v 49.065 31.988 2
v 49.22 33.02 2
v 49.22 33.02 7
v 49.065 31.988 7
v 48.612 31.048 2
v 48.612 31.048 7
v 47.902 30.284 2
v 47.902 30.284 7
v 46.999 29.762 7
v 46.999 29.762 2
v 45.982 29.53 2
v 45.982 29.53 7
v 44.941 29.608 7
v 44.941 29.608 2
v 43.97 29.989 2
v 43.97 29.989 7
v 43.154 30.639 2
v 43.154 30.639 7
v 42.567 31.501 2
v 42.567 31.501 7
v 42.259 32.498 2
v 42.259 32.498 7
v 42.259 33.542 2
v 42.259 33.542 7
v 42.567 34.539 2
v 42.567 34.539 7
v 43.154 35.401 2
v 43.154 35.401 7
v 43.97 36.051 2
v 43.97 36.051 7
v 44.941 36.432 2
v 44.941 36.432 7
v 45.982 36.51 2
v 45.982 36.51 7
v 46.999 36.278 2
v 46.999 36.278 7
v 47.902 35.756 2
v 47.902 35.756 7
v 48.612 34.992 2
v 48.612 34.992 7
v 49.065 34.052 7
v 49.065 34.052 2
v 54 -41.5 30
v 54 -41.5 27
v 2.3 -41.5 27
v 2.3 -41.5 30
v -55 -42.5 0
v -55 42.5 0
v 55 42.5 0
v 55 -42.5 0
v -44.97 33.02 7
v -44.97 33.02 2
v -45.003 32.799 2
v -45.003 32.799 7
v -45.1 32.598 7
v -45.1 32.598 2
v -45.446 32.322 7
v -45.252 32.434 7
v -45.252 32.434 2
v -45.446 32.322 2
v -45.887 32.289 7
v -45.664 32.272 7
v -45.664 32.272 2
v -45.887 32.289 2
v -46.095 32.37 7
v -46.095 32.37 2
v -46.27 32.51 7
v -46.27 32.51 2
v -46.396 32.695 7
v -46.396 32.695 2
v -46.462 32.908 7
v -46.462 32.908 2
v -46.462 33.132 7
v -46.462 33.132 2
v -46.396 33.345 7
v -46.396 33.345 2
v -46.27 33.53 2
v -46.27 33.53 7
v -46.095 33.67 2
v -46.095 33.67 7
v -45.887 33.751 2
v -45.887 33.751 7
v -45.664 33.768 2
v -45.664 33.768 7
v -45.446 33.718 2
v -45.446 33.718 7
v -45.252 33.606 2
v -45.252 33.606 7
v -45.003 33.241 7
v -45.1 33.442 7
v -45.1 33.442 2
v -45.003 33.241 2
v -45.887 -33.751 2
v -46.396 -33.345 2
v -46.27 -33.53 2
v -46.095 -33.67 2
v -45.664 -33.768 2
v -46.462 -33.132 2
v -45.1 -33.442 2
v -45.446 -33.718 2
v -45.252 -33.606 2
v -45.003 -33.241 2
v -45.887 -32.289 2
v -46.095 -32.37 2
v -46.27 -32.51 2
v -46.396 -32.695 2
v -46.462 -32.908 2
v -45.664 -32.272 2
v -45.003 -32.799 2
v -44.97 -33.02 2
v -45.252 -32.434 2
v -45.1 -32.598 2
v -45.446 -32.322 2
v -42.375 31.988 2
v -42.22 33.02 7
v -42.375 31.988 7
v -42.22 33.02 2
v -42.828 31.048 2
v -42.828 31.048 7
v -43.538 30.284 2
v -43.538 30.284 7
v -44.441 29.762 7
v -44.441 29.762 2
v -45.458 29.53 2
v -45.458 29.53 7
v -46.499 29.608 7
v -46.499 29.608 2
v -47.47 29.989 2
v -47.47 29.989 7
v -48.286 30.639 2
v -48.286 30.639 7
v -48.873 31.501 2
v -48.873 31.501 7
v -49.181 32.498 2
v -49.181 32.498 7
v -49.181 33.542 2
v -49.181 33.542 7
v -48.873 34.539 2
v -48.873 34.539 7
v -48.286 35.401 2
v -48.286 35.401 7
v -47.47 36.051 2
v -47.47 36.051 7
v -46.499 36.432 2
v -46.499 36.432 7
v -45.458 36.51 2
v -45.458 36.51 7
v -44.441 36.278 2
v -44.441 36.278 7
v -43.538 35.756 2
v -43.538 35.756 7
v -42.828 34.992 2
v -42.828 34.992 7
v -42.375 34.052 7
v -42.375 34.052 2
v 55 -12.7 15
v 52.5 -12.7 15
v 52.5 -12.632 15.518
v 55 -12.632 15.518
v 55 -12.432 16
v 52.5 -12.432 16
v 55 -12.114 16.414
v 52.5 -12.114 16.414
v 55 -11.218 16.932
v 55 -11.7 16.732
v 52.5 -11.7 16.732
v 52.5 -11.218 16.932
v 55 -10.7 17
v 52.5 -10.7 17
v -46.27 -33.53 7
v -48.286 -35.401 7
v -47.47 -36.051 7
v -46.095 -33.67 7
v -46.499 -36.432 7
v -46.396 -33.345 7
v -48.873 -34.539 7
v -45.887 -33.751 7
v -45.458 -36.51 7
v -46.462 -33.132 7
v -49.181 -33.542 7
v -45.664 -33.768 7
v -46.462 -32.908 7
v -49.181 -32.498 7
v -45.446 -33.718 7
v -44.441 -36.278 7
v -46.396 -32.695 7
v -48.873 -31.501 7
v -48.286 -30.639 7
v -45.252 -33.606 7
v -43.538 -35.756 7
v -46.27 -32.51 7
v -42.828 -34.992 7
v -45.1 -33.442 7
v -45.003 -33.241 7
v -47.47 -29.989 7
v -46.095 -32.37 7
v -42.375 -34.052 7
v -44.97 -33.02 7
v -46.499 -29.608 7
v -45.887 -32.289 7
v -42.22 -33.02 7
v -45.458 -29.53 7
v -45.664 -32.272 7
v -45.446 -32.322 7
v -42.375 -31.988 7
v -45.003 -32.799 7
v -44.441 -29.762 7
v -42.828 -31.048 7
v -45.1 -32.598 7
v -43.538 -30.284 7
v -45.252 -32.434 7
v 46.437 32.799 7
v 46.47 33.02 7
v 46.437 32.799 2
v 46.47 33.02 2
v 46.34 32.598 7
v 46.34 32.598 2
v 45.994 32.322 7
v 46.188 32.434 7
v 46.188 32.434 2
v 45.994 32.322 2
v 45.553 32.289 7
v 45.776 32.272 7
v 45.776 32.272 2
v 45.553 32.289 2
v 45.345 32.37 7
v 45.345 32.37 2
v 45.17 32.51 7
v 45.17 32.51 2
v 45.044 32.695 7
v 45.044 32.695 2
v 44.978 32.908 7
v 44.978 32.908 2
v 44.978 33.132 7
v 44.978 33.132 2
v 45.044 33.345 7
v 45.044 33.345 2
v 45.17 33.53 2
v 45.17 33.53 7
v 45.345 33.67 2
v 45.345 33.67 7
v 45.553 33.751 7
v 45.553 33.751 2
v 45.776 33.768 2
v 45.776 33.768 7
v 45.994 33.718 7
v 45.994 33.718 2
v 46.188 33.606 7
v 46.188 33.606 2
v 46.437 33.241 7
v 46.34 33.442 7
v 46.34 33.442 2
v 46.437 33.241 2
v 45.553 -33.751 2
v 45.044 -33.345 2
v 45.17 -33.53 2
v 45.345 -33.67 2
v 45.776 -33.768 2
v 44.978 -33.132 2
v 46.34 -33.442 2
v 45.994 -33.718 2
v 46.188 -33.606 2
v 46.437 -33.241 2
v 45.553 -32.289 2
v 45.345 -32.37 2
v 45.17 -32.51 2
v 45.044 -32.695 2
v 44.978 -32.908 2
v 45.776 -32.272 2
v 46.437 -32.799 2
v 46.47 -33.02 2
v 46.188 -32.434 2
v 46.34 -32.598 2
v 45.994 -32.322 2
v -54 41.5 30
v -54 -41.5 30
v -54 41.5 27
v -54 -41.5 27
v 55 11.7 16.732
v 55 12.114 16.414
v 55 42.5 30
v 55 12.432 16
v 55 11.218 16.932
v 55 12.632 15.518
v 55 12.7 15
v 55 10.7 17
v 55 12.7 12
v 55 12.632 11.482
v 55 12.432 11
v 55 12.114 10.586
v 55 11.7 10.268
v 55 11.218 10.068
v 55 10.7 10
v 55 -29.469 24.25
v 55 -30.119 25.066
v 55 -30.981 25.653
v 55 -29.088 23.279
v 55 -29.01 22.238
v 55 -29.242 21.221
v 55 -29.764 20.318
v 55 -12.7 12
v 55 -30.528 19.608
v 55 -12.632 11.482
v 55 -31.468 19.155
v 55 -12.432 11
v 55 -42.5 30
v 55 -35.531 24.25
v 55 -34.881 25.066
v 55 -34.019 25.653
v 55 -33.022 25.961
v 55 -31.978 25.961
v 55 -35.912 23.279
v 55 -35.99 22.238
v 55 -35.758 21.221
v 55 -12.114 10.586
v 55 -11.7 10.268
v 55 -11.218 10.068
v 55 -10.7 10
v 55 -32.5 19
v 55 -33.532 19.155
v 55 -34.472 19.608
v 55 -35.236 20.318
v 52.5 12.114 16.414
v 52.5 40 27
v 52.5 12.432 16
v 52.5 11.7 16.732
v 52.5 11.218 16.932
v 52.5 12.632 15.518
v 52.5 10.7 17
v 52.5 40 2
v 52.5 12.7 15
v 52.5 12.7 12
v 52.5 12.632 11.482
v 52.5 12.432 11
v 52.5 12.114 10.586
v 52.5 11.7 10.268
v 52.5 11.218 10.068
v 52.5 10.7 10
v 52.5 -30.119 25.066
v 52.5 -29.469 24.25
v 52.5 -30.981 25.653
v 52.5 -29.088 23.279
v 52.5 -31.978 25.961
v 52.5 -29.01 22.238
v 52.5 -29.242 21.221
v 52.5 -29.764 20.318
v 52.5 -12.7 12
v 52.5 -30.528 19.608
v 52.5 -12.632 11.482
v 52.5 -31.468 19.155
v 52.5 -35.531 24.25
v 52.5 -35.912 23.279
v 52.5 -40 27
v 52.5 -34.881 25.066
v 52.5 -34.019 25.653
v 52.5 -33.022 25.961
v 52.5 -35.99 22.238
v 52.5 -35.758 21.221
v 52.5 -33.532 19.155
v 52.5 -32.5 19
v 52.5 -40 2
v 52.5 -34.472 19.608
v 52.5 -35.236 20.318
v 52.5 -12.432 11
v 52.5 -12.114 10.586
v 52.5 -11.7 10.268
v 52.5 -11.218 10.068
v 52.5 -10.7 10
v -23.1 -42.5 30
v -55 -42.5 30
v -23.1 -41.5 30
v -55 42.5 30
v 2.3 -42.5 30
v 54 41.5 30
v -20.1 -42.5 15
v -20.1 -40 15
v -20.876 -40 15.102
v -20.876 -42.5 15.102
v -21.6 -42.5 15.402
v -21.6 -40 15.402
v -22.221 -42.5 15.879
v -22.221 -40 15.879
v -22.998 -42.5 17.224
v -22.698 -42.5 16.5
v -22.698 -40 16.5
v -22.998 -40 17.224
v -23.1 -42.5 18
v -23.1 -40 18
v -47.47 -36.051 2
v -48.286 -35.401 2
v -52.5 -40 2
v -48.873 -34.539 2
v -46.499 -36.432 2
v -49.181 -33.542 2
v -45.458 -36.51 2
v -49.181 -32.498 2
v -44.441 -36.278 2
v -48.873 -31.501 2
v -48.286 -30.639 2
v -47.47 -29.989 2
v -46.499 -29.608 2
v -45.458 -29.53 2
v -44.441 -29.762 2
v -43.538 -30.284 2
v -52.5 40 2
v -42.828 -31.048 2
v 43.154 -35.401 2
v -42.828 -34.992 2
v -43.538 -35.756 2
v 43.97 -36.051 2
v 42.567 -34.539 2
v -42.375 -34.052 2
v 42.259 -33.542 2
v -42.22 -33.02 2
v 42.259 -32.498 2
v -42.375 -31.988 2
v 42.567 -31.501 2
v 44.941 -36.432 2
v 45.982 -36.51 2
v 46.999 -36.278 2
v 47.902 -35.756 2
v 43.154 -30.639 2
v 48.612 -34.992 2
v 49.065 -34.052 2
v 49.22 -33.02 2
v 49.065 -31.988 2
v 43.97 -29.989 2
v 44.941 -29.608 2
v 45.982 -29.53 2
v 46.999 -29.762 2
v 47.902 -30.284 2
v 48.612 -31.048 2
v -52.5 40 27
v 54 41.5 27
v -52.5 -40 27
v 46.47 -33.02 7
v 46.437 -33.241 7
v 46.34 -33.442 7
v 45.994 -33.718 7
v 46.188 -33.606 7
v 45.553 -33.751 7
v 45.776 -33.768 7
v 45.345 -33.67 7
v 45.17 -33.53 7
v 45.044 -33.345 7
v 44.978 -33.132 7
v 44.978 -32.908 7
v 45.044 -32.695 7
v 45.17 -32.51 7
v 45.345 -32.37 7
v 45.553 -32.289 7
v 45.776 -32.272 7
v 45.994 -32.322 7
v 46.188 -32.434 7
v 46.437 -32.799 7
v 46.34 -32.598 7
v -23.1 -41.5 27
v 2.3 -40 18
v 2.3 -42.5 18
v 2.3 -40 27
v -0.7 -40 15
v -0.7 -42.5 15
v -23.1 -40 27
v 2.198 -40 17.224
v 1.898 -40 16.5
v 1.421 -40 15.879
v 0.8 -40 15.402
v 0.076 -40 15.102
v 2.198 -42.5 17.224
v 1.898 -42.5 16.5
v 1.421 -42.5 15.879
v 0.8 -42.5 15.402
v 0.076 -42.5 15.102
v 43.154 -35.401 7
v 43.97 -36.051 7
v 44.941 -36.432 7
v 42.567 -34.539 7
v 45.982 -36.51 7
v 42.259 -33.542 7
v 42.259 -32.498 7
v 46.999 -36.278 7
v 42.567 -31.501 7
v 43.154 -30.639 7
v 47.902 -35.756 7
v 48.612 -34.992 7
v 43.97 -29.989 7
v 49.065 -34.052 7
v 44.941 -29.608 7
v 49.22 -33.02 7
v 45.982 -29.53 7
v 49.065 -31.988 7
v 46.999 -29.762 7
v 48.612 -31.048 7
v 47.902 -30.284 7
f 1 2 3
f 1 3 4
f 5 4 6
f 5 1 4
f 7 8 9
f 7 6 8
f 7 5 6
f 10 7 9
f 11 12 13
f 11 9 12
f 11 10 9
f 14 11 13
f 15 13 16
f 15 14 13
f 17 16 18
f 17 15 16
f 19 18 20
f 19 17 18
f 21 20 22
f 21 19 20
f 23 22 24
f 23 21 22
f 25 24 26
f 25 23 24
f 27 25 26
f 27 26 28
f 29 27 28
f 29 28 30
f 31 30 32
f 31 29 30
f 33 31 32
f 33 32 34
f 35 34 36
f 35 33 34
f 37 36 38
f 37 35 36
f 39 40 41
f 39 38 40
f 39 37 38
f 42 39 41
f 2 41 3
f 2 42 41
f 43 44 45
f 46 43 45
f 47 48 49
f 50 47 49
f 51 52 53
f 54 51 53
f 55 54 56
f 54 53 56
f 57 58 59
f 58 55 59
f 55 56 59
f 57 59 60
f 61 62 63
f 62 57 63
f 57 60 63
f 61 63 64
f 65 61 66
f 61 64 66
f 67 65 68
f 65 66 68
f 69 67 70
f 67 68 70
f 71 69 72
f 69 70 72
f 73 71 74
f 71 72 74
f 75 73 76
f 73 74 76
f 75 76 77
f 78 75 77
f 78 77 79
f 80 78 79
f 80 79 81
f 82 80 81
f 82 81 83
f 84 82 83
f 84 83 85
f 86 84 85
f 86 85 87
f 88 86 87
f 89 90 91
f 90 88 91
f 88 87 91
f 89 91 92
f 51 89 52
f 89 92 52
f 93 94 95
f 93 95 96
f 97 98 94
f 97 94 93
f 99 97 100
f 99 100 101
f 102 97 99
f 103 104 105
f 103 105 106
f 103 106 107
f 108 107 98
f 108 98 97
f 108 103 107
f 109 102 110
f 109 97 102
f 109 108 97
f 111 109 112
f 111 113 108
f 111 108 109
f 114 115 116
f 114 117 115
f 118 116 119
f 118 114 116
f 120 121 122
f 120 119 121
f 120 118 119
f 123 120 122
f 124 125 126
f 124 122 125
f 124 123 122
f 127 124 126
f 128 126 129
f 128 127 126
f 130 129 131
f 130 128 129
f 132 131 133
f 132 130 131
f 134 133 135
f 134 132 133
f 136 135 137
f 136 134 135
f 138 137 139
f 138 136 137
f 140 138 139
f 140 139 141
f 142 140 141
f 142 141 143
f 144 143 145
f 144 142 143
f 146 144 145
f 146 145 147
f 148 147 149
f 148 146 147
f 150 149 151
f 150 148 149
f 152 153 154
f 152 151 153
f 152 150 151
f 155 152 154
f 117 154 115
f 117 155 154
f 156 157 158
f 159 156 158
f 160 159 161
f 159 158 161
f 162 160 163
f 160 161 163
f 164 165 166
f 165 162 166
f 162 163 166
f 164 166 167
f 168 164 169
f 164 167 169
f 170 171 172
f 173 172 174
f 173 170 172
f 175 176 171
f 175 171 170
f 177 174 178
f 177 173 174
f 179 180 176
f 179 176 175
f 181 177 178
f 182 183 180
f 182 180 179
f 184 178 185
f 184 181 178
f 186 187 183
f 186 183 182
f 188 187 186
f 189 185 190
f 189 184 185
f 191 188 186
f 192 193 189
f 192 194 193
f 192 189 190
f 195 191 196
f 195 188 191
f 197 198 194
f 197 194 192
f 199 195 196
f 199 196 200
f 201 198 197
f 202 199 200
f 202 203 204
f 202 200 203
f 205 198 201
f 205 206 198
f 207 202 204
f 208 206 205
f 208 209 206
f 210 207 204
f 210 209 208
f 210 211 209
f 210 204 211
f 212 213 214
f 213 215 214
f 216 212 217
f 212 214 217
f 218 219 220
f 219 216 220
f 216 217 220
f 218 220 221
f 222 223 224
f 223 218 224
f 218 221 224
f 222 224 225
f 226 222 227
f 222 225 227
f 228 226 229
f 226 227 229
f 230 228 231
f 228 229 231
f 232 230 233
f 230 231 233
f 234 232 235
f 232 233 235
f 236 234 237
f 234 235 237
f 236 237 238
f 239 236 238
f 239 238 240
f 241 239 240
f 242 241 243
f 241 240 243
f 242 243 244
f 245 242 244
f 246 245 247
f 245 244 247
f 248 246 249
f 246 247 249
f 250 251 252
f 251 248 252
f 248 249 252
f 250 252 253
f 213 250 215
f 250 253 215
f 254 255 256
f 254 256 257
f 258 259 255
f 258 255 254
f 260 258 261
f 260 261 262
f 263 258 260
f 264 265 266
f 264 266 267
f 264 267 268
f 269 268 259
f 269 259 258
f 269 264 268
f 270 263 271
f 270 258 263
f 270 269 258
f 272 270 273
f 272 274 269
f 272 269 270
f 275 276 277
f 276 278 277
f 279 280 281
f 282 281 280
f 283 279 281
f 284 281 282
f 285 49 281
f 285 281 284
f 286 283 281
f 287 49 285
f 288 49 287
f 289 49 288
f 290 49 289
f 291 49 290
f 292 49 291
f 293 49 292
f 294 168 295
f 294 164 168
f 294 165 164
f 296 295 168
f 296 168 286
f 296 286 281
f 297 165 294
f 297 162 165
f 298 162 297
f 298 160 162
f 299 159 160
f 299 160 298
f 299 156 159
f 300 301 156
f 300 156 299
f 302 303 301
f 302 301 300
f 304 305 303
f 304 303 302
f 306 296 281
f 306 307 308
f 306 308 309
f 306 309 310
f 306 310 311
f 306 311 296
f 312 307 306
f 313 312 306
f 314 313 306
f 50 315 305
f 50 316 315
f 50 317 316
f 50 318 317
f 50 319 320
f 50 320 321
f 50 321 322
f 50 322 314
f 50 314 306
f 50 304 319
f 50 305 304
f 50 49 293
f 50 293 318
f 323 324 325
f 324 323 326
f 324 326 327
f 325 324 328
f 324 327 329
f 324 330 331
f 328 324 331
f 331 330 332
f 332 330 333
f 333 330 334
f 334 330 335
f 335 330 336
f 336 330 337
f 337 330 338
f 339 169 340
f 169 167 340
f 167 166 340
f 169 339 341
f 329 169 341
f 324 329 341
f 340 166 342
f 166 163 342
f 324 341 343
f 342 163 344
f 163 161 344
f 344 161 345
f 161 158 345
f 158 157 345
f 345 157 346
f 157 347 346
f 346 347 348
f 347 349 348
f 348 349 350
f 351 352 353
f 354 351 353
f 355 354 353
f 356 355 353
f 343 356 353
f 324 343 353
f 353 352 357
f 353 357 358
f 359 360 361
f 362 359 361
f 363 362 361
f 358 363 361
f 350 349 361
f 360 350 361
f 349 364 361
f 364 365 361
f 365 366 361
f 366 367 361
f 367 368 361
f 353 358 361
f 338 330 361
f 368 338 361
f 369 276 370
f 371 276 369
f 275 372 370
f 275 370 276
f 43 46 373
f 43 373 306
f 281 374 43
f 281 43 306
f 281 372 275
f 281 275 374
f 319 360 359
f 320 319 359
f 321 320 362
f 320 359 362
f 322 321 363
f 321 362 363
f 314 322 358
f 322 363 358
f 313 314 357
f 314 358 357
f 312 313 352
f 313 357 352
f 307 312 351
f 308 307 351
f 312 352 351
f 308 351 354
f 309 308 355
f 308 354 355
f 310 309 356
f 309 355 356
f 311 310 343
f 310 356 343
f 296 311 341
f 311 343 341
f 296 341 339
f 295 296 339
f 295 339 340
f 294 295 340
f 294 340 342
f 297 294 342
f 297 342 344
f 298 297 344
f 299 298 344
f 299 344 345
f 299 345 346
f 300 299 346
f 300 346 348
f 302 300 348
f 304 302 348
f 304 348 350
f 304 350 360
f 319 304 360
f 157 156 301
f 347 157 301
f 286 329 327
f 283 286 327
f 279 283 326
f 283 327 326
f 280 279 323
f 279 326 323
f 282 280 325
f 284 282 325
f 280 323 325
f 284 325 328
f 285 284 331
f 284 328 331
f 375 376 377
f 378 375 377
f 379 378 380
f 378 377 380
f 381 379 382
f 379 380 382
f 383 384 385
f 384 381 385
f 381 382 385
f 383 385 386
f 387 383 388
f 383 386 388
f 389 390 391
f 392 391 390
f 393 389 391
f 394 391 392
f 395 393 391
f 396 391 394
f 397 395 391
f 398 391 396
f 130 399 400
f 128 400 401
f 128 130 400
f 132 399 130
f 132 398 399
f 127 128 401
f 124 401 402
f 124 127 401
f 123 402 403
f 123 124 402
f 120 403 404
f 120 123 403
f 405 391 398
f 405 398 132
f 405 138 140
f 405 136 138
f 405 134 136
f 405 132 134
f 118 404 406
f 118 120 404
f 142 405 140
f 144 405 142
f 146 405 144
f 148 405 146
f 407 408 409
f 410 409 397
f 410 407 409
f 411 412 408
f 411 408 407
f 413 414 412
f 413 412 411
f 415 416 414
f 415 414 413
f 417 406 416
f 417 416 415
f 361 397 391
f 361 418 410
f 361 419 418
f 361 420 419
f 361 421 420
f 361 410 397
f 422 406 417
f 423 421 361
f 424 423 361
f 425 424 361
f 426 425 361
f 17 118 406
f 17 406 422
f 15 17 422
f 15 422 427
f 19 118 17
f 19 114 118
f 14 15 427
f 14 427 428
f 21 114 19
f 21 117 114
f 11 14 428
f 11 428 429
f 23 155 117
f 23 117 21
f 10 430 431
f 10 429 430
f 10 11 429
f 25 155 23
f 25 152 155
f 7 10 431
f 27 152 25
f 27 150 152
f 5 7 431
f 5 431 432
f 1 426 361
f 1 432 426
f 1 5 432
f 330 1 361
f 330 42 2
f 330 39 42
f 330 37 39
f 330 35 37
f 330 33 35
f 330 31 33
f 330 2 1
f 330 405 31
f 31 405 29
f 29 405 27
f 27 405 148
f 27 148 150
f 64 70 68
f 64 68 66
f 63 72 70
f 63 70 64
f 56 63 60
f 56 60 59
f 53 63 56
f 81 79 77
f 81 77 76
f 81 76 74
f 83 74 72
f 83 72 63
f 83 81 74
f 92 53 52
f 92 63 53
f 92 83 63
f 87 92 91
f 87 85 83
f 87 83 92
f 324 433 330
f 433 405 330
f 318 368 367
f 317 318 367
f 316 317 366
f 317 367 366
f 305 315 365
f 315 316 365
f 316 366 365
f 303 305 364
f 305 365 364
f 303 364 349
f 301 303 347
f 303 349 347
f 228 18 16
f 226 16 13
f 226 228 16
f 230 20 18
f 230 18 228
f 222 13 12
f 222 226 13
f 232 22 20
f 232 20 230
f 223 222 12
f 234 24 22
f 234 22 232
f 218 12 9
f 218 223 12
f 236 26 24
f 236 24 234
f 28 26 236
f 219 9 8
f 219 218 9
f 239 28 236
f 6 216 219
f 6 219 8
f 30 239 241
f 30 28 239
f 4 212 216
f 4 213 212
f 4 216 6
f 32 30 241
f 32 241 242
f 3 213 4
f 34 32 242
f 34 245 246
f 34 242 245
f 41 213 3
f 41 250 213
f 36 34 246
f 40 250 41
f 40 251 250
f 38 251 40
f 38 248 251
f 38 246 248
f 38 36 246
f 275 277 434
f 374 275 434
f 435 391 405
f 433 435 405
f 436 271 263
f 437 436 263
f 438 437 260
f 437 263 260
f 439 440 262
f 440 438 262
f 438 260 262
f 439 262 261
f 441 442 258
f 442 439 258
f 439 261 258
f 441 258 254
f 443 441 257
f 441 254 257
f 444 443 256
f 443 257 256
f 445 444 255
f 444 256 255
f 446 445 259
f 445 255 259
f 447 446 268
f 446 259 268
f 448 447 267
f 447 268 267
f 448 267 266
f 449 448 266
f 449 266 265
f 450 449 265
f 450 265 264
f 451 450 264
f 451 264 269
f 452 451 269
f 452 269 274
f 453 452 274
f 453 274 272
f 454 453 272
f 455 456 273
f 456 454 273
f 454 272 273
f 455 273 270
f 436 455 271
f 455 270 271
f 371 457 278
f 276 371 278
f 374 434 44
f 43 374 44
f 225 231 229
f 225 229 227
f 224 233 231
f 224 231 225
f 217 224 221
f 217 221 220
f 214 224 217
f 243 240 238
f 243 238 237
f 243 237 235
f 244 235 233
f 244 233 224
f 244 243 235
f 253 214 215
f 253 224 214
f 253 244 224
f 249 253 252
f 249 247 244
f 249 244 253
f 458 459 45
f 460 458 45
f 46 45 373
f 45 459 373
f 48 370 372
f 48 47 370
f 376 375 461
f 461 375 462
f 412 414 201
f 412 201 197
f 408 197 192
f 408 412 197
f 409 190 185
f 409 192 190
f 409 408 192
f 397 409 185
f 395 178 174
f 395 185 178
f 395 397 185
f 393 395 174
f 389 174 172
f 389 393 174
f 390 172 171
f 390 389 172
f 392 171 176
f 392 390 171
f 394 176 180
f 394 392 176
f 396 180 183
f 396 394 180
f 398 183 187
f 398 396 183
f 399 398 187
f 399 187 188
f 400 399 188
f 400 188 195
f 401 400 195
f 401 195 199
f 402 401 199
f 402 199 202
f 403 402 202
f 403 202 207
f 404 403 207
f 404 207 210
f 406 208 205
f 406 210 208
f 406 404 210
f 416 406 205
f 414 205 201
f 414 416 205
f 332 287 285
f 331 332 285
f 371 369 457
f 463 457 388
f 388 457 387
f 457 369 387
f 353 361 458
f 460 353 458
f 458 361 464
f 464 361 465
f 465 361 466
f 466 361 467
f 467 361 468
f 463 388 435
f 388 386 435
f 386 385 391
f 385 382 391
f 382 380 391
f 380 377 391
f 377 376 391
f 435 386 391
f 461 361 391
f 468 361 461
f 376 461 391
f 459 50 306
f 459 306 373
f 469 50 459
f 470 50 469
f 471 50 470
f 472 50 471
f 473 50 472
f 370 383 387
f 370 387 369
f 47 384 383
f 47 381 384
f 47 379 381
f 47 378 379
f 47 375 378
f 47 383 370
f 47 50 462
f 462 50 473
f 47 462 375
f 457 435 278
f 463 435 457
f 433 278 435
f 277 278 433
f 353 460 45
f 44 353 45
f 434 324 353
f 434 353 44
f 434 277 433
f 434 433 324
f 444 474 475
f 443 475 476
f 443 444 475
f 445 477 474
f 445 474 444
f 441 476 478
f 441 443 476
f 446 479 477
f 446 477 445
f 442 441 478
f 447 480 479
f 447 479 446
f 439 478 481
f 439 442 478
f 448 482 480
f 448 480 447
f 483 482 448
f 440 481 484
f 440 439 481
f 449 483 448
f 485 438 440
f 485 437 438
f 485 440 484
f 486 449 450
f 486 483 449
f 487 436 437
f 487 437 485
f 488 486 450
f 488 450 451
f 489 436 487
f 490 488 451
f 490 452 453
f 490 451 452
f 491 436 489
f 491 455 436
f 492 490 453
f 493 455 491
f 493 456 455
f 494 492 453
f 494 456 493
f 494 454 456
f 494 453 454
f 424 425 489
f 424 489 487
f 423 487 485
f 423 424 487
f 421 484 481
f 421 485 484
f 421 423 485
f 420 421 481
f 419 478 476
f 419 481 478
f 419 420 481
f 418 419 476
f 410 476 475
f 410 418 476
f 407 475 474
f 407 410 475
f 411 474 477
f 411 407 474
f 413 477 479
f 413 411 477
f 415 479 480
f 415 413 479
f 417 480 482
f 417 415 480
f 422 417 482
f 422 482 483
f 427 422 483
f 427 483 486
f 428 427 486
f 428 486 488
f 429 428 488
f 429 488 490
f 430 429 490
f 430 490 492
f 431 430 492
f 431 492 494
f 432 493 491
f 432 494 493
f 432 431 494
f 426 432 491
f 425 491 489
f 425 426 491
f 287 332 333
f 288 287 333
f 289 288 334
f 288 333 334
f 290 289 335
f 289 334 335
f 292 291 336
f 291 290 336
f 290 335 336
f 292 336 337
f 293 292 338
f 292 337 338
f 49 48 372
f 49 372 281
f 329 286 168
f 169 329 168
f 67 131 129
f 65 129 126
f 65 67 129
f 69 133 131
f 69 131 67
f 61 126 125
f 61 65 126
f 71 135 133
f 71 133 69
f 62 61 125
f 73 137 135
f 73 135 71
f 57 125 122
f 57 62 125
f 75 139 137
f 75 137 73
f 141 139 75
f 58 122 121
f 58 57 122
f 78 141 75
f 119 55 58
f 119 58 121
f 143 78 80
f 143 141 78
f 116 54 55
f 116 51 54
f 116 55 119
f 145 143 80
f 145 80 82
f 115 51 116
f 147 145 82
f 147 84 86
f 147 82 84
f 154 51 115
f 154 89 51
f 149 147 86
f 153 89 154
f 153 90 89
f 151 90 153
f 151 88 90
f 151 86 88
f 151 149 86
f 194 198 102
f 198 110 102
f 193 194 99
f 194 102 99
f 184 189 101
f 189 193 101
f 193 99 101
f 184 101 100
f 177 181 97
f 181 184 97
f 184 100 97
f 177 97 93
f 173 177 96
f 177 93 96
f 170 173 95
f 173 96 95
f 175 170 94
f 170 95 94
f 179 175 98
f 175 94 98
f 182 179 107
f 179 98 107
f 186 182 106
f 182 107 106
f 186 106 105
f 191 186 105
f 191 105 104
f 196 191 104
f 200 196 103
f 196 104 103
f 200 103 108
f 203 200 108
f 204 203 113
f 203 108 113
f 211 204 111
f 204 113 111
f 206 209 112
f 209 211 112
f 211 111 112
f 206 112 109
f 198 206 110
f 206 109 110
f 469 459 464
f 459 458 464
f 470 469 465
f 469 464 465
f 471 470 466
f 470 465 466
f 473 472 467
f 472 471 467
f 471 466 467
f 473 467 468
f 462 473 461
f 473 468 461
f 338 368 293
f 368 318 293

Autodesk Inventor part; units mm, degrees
ref_plane "YZ Plane" through (0, 0, 0) normal (1, 0, 0) x (0, 1, 0)
ref_plane "XZ Plane" through (0, 0, 0) normal (0, 1, 0) x (-1, 0, 0)
ref_plane "XY Plane" through (0, 0, 0) normal (0, 0, 1) x (1, 0, 0)
sketch "Esboço1" plane through (0, 0, 0) normal (0, 0, 1) x (1, 0, 0)
  line L0 (-55, -42.5) -> (55, -42.5)
  line L1 (55, -42.5) -> (55, 42.5)
  line L2 (55, 42.5) -> (-55, 42.5)
  line L3 (-55, 42.5) -> (-55, -42.5)
  line L4 (-55, -42.5) -> (55, 42.5) construction
  line L5 (55, -42.5) -> (-55, 42.5) construction
  point P0 (0, 0)
  dimension "d0" = 110
  dimension "d1" = 85
extrude "Extrusão1" add sketch "Esboço1" along normal blind 2
sketch "Esboço2" plane through (0, 0, 2) normal (0, 0, 1) x (1, 0, 0)
  line L0 (55, 42.5) -> (-55, 42.5) projected
  line L1 (55, -42.5) -> (-55, -42.5)
  line L2 (-55, -42.5) -> (-55, 42.5)
  line L3 (-55, 42.5) -> (55, 42.5)
  line L4 (55, 42.5) -> (55, -42.5)
  line L5 (55, -42.5) -> (-55, 42.5) construction
  line L6 (-55, -42.5) -> (55, 42.5) construction
  line L7 (52.5, -40) -> (-52.5, -40)
  line L8 (-52.5, -40) -> (-52.5, 40)
  line L9 (-52.5, 40) -> (52.5, 40)
  line L10 (52.5, 40) -> (52.5, -40)
  line L11 (52.5, -40) -> (-52.5, 40) construction
  line L12 (-52.5, -40) -> (52.5, 40) construction
  point P0 (0, 0)
  point P1 (55, 42.5)
  dimension "d4" = 105
  dimension "d5" = 80
extrude "Extrusão2" add sketch "Esboço2" along normal blind 25
sketch "Esboço3" plane through (0, 0, 2) normal (0, 0, 1) x (1, 0, 0)
  line L0 (-45.72, -33.02) -> (45.72, 33.02) construction
  line L1 (45.72, -33.02) -> (-45.72, 33.02) construction
  circle A0 centre (-45.72, 33.02) radius 3.5
  circle A1 centre (45.72, 33.02) radius 3.5
  circle A2 centre (-45.72, -33.02) radius 3.5
  circle A3 centre (45.72, -33.02) radius 3.5
  circle A4 centre (-45.72, 33.02) radius 0.75
  circle A5 centre (45.72, 33.02) radius 0.75
  circle A6 centre (-45.72, -33.02) radius 0.75
  circle A7 centre (45.72, -33.02) radius 0.75
  point P0 (0, 0)
  dimension "d10" = 7
  dimension "d11" = 7
  dimension "d12" = 7
  dimension "d13" = 7
  dimension "d20" = 1.5
  dimension "d21" = 1.5
  dimension "d22" = 1.5
  dimension "d23" = 1.5
extrude "Extrusão3" add sketch "Esboço3" along normal blind 5
sketch "Esboço4" plane through (0, 0, 27) normal (0, 0, 1) x (1, 0, 0)
  line L0 (55, -42.5) -> (-55, -42.5)
  line L1 (-55, -42.5) -> (-55, 42.5)
  line L2 (-55, 42.5) -> (55, 42.5)
  line L3 (55, 42.5) -> (55, -42.5)
  line L4 (55, -42.5) -> (-55, 42.5) construction
  line L5 (-55, -42.5) -> (55, 42.5) construction
  line L6 (54, -41.5) -> (-54, -41.5)
  line L7 (-54, -41.5) -> (-54, 41.5)
  line L8 (-54, 41.5) -> (54, 41.5)
  line L9 (54, 41.5) -> (54, -41.5)
  line L10 (54, -41.5) -> (-54, 41.5) construction
  line L11 (-54, -41.5) -> (54, 41.5) construction
  point P0 (0, 0)
  dimension "d16" = 108
  dimension "d17" = 83
extrude "Extrusão4" add sketch "Esboço4" along normal blind 3
sketch "Esboço8" plane through (-55, -42.5, 0) normal (0, -1, 0) x (1, 0, 0)
  line L0 (31.9, 15) -> (57.3, 15)
  line L1 (57.3, 15) -> (57.3, 30)
  line L2 (57.3, 30) -> (31.9, 30)
  line L3 (31.9, 30) -> (31.9, 15)
  line L4 (0, 30) -> (110, 30) projected
  line L5 (0, 0) -> (0, 30) projected
  point P0 (53.5, 0)
  dimension "d55" = 25.4
  dimension "d56" = 15
  dimension "d57" = 31.9
extrude "Extrusão5" cut sketch "Esboço8" against normal blind 3
fillet "Arredondamento5" radius 3 2 edges at (-23.1, -41.25, 15) (2.3, -41.25, 15)
sketch "Esboço11" plane through (55, -42.5, 0) normal (1, 0, 0) x (0, 0, -1)
  line L0 (-30, 0) -> (-30, 85) projected
  line L1 (0, 0) -> (-30, 0) projected
  point P0 (0, 42.5)
  point P1 (-22.5, 10)
  dimension "d66" = 7.5
  dimension "d67" = 10
hole "Furo1" at (55, -32.5, 22.5) direction (-1, 0, 0) diameter 7 depth 2.5
sketch "Esboço12" plane through (55, -42.5, 0) normal (1, 0, 0) x (0, 0, -1)
  line L0 (-17, 29.8) -> (-10, 29.8)
  line L1 (-10, 29.8) -> (-10, 55.2)
  line L2 (-10, 55.2) -> (-17, 55.2)
  line L3 (-17, 55.2) -> (-17, 29.8)
  line L4 (0, 0) -> (-30, 0) projected
  line L5 (0, 0) -> (0, 85) projected
  point P0 (0, 42.5)
  point P1 (-13.5, 29.8)
  point P2 (-10, 42.5)
  point P3 (0, 42.5)
  dimension "d68" = 7
  dimension "d69" = 25.4
  dimension "d71" = 10
extrude "Extrusão8" cut sketch "Esboço12" against normal blind 3
fillet "Arredondamento6" radius 2 4 edges at (53.75, -12.7, 10) (53.75, -12.7, 17) (53.75, 12.7, 17) (53.75, 12.7, 10)
properties part number "Case" material "ABS plástico"
